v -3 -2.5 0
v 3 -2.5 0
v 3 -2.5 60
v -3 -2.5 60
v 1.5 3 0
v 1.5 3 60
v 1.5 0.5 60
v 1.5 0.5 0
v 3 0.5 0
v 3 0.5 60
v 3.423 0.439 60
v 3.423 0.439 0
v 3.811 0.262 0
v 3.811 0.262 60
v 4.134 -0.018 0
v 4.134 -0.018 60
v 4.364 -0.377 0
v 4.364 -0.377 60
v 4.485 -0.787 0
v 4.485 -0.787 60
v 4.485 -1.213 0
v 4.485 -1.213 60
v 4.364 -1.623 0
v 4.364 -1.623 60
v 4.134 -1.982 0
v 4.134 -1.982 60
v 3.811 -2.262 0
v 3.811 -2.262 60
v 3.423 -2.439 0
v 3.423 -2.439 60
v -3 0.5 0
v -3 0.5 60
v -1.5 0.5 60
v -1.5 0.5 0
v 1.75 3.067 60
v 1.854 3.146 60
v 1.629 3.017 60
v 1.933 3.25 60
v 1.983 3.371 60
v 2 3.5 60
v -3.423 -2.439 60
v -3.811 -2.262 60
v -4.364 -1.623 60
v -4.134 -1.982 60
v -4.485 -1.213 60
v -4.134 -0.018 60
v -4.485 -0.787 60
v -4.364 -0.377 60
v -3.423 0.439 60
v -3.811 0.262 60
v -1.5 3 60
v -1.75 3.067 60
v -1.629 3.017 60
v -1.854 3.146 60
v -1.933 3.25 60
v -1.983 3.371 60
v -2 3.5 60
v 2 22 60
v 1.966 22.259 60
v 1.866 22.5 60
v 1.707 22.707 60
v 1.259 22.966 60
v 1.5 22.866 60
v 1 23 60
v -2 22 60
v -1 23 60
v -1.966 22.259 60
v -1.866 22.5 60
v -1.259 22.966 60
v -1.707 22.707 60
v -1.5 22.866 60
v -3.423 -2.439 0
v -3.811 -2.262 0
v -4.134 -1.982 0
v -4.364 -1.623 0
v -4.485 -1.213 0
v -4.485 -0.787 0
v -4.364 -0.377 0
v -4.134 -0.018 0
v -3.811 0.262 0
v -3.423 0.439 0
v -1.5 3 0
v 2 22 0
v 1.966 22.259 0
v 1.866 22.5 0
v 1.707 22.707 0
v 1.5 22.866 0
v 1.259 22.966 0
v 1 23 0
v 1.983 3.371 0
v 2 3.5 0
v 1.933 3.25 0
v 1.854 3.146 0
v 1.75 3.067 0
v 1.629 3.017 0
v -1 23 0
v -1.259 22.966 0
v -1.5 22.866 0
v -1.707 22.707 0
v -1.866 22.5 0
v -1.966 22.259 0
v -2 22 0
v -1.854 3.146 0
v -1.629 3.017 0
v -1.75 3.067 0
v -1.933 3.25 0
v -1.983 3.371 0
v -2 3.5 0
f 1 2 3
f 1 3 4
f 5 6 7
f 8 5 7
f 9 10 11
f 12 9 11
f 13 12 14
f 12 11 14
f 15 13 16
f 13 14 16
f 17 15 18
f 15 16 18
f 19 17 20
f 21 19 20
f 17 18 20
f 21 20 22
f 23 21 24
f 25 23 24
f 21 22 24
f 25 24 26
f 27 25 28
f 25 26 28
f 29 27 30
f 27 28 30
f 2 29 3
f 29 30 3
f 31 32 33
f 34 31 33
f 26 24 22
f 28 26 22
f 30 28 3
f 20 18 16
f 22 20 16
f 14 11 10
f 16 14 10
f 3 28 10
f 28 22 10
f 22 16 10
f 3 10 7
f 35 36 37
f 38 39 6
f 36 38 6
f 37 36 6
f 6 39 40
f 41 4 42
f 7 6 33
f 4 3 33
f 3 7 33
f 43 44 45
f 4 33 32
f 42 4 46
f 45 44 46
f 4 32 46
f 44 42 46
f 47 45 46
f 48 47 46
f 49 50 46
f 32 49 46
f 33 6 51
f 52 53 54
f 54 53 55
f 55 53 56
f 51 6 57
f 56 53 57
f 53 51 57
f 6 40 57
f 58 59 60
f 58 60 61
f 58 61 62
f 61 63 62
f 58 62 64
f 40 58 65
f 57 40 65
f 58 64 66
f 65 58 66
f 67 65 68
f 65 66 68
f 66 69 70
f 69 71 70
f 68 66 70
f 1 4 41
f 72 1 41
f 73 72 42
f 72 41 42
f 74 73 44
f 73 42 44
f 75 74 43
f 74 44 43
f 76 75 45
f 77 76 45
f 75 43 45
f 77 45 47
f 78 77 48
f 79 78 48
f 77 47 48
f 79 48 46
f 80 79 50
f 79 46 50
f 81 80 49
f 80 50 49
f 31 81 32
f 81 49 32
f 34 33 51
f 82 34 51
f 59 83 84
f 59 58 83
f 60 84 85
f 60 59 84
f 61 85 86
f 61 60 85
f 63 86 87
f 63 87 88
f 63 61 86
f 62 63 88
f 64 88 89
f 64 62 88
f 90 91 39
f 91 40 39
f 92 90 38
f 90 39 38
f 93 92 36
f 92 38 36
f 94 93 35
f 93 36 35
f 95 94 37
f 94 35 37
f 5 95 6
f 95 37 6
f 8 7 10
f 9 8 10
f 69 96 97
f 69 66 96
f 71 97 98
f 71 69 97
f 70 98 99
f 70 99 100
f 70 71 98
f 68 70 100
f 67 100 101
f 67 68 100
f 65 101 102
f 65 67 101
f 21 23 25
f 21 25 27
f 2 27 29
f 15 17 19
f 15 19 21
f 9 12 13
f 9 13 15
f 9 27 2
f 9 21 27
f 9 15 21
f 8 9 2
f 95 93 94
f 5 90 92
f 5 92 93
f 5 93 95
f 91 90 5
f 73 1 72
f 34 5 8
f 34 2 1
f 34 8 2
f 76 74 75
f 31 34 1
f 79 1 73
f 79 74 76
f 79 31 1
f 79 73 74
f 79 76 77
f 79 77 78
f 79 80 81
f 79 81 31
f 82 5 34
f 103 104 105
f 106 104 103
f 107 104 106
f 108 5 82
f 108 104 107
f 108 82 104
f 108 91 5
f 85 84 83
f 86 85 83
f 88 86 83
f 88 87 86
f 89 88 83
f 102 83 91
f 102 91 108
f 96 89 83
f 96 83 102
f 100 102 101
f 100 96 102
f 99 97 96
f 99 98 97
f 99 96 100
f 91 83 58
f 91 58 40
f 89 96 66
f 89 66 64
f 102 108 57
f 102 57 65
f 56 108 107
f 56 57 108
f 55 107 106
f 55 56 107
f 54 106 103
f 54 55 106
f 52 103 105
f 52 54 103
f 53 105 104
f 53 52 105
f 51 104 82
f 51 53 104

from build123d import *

# Parameters (mm, degrees)
BOSS_EXTRUDE1_DEPTH = 60
CUT_EXTRUDE1_DEPTH  = 60
FILLET19_R          = 0.5
FILLET20_R          = 0.5
FILLET22_R          = 1


with BuildPart() as part:
    # Sketch1 → Boss-Extrude1 (new body)
    with BuildSketch(Plane.XY):
        Polygon((-2, 3), (-2, 23), (2, 23), (2, 3), (6, 3), (6, -3), (-6, -3), (-6, 3), align=None)
    extrude(amount=BOSS_EXTRUDE1_DEPTH)

    # Sketch2 → Cut-Extrude1 (cut)
    with BuildSketch(Plane.XY.offset(60)):
        with BuildLine():
            Line((-6, -3), (6, -3))
            Line((6, -3), (6, 3))
            Line((6, 3), (1.5, 3))
            Line((1.5, 3), (1.5, 0.5))
            Line((1.5, 0.5), (3, 0.5))
            ThreePointArc((3, 0.5), (4.5, -1), (3, -2.5))
            Line((3, -2.5), (-3, -2.5))
            ThreePointArc((-3, -2.5), (-4.5, -1), (-3, 0.5))
            Line((-3, 0.5), (-1.5, 0.5))
            Line((-1.5, 0.5), (-1.5, 3))
            Line((-1.5, 3), (-6, 3))
            Line((-6, 3), (-6, -3))
        make_face()
    extrude(amount=-CUT_EXTRUDE1_DEPTH, mode=Mode.SUBTRACT)

    # Fillet19
    fillet19_edges = [part.edges().sort_by_distance(p)[0] for p in [
        (-2, 3, 30),
    ]]
    fillet(fillet19_edges, radius=FILLET19_R - 0.0001)  # a hair under: the kernel refuses the full size

    # Fillet20
    fillet20_edges = [part.edges().sort_by_distance(p)[0] for p in [
        (2, 3, 30),
    ]]
    fillet(fillet20_edges, radius=FILLET20_R - 0.0001)  # a hair under: the kernel refuses the full size

    # Fillet22
    fillet22_edges = [part.edges().sort_by_distance(p)[0] for p in [
        (-2, 23, 30),
        (2, 23, 30),
    ]]
    fillet(fillet22_edges, radius=FILLET22_R)


solid = part.part
